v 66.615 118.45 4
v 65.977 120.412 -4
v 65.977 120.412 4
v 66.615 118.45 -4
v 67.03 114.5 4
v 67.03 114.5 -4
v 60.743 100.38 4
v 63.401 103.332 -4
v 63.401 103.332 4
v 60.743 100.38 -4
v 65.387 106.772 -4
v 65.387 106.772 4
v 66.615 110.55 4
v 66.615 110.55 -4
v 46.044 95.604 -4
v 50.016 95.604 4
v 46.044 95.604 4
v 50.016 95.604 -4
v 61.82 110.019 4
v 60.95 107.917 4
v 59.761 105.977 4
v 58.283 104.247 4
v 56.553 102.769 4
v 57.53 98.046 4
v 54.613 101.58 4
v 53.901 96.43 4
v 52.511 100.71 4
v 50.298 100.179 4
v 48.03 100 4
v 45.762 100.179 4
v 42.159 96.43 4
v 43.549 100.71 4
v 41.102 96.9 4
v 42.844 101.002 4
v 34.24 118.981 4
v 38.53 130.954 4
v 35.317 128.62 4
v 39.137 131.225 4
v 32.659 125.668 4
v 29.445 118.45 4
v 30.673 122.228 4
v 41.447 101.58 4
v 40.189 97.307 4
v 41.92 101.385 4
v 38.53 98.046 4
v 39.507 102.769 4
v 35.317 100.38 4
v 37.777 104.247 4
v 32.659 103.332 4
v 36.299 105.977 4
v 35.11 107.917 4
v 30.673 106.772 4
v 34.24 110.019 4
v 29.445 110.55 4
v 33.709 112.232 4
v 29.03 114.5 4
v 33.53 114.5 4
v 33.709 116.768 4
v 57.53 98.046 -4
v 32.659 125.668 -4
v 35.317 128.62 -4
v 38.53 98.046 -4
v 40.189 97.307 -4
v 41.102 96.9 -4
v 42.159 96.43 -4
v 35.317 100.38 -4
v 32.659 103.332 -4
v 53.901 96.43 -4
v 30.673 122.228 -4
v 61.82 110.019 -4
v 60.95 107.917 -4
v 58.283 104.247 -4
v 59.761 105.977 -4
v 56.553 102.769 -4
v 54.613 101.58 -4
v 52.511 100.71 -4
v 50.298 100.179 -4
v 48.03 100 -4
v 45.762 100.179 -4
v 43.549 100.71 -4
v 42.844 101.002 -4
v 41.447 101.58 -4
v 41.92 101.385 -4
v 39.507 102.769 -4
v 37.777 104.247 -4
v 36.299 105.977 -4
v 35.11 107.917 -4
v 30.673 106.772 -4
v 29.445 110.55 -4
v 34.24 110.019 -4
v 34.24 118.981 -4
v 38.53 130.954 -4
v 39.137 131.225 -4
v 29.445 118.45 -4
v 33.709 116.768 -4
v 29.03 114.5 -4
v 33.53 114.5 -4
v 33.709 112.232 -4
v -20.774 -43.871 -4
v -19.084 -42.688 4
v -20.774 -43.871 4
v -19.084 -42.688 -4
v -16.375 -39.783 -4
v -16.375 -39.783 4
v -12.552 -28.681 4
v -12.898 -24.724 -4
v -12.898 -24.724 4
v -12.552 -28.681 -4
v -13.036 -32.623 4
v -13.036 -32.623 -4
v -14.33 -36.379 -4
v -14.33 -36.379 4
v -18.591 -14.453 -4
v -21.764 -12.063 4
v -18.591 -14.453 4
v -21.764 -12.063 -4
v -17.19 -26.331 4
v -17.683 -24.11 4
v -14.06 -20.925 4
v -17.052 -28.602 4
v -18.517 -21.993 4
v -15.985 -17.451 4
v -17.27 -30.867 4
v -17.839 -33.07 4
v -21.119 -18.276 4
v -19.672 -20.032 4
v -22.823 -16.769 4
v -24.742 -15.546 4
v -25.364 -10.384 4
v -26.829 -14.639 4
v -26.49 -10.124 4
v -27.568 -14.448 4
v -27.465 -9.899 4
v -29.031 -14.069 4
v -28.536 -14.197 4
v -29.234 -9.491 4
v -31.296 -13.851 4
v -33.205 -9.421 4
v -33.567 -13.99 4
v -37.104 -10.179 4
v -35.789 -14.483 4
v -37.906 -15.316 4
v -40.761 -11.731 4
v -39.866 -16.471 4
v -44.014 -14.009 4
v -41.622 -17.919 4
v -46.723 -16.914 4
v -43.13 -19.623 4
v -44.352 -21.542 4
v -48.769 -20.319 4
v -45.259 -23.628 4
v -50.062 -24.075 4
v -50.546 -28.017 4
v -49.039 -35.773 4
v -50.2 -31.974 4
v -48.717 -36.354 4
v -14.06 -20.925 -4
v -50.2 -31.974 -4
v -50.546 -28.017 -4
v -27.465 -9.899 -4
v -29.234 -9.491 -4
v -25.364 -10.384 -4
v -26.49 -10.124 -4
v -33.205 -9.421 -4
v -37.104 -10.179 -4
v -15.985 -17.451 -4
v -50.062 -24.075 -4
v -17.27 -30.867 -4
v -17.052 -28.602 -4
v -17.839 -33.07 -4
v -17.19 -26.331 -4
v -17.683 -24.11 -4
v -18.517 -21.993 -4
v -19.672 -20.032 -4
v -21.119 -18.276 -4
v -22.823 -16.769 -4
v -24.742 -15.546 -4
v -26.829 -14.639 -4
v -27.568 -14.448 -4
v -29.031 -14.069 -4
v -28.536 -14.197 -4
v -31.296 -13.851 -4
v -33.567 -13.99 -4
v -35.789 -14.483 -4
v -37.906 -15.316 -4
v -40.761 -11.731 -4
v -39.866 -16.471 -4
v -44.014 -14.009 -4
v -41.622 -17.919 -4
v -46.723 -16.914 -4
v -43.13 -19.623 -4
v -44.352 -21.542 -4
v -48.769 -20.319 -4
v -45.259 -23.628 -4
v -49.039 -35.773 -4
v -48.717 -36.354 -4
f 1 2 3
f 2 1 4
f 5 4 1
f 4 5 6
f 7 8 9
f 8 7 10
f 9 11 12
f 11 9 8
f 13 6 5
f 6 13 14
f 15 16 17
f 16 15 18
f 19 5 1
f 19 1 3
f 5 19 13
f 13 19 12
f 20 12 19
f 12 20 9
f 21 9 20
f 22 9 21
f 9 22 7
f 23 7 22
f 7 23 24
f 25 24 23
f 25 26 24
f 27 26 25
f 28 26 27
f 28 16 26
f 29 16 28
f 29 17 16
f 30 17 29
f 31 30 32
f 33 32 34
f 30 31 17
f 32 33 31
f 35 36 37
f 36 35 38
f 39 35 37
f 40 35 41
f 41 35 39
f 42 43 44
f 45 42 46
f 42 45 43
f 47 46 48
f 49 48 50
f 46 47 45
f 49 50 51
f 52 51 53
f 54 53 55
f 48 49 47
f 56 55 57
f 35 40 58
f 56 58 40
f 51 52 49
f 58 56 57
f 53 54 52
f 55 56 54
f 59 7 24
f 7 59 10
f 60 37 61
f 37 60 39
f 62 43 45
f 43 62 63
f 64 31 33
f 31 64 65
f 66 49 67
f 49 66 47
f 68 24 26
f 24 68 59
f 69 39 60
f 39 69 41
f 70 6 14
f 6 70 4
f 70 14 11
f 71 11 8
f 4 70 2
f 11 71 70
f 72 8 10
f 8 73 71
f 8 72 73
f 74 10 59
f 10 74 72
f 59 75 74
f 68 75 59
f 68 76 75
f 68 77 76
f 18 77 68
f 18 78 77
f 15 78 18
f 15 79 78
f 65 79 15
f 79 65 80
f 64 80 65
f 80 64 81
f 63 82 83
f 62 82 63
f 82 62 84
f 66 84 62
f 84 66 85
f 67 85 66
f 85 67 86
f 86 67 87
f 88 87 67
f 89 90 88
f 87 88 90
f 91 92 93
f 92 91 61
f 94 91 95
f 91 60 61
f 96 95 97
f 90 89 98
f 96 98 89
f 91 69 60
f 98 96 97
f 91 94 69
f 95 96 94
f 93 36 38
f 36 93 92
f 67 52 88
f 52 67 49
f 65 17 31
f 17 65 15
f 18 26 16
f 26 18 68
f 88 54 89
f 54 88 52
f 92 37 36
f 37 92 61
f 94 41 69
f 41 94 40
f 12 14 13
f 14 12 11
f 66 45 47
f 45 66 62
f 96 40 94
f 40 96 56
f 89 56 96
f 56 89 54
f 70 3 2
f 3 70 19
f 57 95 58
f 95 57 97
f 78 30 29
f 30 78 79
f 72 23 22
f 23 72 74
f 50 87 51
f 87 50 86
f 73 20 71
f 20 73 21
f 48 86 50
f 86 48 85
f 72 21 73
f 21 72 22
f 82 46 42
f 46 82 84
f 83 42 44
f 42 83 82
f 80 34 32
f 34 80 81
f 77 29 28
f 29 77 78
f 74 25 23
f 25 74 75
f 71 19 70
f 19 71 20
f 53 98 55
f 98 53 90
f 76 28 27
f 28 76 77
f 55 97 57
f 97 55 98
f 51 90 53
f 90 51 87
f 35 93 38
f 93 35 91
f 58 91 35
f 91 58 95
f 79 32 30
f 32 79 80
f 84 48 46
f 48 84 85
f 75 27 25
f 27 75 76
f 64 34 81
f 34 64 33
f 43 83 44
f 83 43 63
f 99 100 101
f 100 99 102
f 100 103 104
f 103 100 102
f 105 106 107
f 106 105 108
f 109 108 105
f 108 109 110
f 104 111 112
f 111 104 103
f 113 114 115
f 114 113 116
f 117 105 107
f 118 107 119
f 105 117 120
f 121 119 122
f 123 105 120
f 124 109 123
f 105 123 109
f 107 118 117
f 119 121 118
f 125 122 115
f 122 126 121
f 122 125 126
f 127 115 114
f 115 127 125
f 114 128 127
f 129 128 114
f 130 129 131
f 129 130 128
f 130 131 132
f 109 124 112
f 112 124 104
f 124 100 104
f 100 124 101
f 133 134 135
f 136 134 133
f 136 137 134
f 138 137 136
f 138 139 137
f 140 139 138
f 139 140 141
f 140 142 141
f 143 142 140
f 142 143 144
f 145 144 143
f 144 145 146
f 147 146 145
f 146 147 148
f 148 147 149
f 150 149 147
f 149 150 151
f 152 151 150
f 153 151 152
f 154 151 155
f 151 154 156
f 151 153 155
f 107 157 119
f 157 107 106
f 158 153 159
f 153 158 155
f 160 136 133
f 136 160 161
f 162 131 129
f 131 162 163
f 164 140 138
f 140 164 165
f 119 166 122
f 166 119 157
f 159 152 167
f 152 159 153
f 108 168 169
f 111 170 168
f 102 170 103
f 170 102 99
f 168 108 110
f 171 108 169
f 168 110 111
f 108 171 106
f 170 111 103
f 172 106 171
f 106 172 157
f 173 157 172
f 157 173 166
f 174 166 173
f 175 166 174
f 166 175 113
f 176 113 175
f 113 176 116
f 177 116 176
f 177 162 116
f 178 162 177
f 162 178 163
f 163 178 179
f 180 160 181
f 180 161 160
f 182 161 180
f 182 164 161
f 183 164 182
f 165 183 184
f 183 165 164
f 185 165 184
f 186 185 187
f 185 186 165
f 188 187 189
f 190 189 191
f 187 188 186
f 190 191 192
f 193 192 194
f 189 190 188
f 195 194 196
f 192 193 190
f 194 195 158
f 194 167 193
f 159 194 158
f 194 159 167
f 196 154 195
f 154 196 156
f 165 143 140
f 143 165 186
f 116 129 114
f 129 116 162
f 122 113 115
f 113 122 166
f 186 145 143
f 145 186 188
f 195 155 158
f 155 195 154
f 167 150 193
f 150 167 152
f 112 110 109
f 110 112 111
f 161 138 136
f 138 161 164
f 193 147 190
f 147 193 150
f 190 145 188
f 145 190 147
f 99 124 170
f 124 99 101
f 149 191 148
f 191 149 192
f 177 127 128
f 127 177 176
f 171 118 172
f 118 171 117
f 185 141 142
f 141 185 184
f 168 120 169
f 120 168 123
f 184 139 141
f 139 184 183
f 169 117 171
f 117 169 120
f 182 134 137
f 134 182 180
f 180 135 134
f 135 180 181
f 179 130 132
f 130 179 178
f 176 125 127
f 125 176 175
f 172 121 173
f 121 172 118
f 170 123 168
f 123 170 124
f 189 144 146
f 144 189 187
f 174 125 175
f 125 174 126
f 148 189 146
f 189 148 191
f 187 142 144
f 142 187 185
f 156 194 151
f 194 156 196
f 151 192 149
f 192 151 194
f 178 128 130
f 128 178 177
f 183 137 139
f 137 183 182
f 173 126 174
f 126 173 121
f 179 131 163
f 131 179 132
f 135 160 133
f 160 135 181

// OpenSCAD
// file: ../../Dollo/NEW_long_ties/globals.scad
/*
Most things in this file is represented as one millimeter, so keep that in mind while changing things.
Some of the setting are not mm but at variables that you can set, such as 2*x=2x and you are setting what x is.
I will try to specify when things are variables and not exact measurements.
*/

// printer slop
slop = 0.15;

obj_leg = 30;
leg_length = 5.5;
small_number = 0.001;
metal_core_rode_global = 5;


///////////////// number of holes /////////////////////
z_hole_number = 8;
other_holes = 8;

///////////////// Pins /////////////////////

//pins that poke out
ball_size = 10;
pin_height = 20;
pin_diameter = 6;


//holes
hole_ball_size = ball_size;
hole_pin_height = pin_height;
hole_pin_diameter = pin_diameter;

///////////////// Z THINGS /////////////////////

berring_slot_width = 7.5;
berring_slot_depth = 6.5;
metal_core_rode = 5;

///////////////// X THINGS /////////////////////

//male dove tails
male_dove_max_width=8;
male_dove_min_width=5;
male_dove_depth=5;
male_dove_height=obj_leg/2;

function scaled_male_dove_max_width() = male_dove_max_width - slop;
function scaled_male_dove_min_width() = male_dove_min_width - slop;
function scaled_male_dove_depth() = male_dove_depth - slop;

//female dove tails, this is found on the y mounts
girl_max_width=11;
girl_min_width=5;
girl_depth=5;
girl_height=obj_leg;


///////////////// Y THINGS /////////////////////
/*
The Y is so normal that all of those global variables at the top should change all of the setting in it, this section is set her incase there are variables set in the future development of this project.
*/

// stepper
motor_side_length = 43.2;
motor_bolt_hole_distance = 31;
motor_center_hole = 23;
motor_shaft_dia = 5;
motor_shaft_hole_dia = 5+2*slop;

// bolts etc.
bolt_hole_dia = 3+2*slop;
bolt_head_hole_dia = 5.8;

m4_bolt_hole_dia = 4+2*slop;
m4_bolt_head_hole_dia = 6.8+2*slop;


m3_nut_side = 5.65;
m3_nut_height = 2.3;
m4_nut_side = 6.85;
m4_nut_height = 3.1;

// threaded rod
lifter_rod_diam = 9.86;
hole_threaded_rod = lifter_rod_diam+2*slop;

// for the extensions
metal_rod_size = 9;
// main file
// PRUSA iteration3
// Spool holder
// GNU GPL v3
// Josef Průša <iam@josefprusa.cz> and contributors
// http://www.reprap.org/wiki/Prusa_Mendel
// http://prusamendel.org

use <../../Dollo/NEW_long_ties/include.scad>;

module dxf_holder(){
   linear_extrude(height = 8, center = true, convexity = 5)
   import (file = "spool holdahMK3.dxf", layer = "0");
}

module spool_holder_left() {
    difference() {
        union() {
            dxf_holder();
            translate([51.53-3.5,123-5-3.5,-4])
            cylinder(h=8, d=38);
        }
        translate([51.53-3.5,123-5-3.5,-5])
        hull() {
            cylinder(d=29,h=10,$fn=40);
            translate([6,15,0])
            cylinder(d=29,h=10,$fn=40);
        }

        translate([51.53-3.5,123-5-3.5,0])
        rotate([0,0,-23])
        cube([1,80,10],center=true);
    }
}

module spool_holder_left_dollo() {
    difference() {
        union() {
            spool_holder_left();

            hull() {
                translate([3,-30,-4])
                chamfered_cube_side(30,38,8,2);

                translate([11,20,-4])
                cube([1,2,8]);
            }
        }
        translate([-6,-30,-5])
        cube([30,30,10]);
        
        translate([-9,-50,-5])
        cube([30,30,10]);
        
        translate([15-6,0,-5])
        male_dovetail();

        translate([-6+30,-15,-5])
        rotate([0,0,-90])
        male_dovetail();
    }
}

module spool_holder_right() {
    mirror([1,0,0])
    spool_holder_left();
}

module spool_holder_right_dollo() {
    mirror([1,0,0])
    spool_holder_left_dollo();
}

translate([-1,92,0])
rotate([0,0,143])
spool_holder_right();

spool_holder_left();

// Dollo frame holders
//translate([-16,105,0])
//rotate([0,0,152])
//spool_holder_right_dollo();
//spool_holder_left_dollo();
